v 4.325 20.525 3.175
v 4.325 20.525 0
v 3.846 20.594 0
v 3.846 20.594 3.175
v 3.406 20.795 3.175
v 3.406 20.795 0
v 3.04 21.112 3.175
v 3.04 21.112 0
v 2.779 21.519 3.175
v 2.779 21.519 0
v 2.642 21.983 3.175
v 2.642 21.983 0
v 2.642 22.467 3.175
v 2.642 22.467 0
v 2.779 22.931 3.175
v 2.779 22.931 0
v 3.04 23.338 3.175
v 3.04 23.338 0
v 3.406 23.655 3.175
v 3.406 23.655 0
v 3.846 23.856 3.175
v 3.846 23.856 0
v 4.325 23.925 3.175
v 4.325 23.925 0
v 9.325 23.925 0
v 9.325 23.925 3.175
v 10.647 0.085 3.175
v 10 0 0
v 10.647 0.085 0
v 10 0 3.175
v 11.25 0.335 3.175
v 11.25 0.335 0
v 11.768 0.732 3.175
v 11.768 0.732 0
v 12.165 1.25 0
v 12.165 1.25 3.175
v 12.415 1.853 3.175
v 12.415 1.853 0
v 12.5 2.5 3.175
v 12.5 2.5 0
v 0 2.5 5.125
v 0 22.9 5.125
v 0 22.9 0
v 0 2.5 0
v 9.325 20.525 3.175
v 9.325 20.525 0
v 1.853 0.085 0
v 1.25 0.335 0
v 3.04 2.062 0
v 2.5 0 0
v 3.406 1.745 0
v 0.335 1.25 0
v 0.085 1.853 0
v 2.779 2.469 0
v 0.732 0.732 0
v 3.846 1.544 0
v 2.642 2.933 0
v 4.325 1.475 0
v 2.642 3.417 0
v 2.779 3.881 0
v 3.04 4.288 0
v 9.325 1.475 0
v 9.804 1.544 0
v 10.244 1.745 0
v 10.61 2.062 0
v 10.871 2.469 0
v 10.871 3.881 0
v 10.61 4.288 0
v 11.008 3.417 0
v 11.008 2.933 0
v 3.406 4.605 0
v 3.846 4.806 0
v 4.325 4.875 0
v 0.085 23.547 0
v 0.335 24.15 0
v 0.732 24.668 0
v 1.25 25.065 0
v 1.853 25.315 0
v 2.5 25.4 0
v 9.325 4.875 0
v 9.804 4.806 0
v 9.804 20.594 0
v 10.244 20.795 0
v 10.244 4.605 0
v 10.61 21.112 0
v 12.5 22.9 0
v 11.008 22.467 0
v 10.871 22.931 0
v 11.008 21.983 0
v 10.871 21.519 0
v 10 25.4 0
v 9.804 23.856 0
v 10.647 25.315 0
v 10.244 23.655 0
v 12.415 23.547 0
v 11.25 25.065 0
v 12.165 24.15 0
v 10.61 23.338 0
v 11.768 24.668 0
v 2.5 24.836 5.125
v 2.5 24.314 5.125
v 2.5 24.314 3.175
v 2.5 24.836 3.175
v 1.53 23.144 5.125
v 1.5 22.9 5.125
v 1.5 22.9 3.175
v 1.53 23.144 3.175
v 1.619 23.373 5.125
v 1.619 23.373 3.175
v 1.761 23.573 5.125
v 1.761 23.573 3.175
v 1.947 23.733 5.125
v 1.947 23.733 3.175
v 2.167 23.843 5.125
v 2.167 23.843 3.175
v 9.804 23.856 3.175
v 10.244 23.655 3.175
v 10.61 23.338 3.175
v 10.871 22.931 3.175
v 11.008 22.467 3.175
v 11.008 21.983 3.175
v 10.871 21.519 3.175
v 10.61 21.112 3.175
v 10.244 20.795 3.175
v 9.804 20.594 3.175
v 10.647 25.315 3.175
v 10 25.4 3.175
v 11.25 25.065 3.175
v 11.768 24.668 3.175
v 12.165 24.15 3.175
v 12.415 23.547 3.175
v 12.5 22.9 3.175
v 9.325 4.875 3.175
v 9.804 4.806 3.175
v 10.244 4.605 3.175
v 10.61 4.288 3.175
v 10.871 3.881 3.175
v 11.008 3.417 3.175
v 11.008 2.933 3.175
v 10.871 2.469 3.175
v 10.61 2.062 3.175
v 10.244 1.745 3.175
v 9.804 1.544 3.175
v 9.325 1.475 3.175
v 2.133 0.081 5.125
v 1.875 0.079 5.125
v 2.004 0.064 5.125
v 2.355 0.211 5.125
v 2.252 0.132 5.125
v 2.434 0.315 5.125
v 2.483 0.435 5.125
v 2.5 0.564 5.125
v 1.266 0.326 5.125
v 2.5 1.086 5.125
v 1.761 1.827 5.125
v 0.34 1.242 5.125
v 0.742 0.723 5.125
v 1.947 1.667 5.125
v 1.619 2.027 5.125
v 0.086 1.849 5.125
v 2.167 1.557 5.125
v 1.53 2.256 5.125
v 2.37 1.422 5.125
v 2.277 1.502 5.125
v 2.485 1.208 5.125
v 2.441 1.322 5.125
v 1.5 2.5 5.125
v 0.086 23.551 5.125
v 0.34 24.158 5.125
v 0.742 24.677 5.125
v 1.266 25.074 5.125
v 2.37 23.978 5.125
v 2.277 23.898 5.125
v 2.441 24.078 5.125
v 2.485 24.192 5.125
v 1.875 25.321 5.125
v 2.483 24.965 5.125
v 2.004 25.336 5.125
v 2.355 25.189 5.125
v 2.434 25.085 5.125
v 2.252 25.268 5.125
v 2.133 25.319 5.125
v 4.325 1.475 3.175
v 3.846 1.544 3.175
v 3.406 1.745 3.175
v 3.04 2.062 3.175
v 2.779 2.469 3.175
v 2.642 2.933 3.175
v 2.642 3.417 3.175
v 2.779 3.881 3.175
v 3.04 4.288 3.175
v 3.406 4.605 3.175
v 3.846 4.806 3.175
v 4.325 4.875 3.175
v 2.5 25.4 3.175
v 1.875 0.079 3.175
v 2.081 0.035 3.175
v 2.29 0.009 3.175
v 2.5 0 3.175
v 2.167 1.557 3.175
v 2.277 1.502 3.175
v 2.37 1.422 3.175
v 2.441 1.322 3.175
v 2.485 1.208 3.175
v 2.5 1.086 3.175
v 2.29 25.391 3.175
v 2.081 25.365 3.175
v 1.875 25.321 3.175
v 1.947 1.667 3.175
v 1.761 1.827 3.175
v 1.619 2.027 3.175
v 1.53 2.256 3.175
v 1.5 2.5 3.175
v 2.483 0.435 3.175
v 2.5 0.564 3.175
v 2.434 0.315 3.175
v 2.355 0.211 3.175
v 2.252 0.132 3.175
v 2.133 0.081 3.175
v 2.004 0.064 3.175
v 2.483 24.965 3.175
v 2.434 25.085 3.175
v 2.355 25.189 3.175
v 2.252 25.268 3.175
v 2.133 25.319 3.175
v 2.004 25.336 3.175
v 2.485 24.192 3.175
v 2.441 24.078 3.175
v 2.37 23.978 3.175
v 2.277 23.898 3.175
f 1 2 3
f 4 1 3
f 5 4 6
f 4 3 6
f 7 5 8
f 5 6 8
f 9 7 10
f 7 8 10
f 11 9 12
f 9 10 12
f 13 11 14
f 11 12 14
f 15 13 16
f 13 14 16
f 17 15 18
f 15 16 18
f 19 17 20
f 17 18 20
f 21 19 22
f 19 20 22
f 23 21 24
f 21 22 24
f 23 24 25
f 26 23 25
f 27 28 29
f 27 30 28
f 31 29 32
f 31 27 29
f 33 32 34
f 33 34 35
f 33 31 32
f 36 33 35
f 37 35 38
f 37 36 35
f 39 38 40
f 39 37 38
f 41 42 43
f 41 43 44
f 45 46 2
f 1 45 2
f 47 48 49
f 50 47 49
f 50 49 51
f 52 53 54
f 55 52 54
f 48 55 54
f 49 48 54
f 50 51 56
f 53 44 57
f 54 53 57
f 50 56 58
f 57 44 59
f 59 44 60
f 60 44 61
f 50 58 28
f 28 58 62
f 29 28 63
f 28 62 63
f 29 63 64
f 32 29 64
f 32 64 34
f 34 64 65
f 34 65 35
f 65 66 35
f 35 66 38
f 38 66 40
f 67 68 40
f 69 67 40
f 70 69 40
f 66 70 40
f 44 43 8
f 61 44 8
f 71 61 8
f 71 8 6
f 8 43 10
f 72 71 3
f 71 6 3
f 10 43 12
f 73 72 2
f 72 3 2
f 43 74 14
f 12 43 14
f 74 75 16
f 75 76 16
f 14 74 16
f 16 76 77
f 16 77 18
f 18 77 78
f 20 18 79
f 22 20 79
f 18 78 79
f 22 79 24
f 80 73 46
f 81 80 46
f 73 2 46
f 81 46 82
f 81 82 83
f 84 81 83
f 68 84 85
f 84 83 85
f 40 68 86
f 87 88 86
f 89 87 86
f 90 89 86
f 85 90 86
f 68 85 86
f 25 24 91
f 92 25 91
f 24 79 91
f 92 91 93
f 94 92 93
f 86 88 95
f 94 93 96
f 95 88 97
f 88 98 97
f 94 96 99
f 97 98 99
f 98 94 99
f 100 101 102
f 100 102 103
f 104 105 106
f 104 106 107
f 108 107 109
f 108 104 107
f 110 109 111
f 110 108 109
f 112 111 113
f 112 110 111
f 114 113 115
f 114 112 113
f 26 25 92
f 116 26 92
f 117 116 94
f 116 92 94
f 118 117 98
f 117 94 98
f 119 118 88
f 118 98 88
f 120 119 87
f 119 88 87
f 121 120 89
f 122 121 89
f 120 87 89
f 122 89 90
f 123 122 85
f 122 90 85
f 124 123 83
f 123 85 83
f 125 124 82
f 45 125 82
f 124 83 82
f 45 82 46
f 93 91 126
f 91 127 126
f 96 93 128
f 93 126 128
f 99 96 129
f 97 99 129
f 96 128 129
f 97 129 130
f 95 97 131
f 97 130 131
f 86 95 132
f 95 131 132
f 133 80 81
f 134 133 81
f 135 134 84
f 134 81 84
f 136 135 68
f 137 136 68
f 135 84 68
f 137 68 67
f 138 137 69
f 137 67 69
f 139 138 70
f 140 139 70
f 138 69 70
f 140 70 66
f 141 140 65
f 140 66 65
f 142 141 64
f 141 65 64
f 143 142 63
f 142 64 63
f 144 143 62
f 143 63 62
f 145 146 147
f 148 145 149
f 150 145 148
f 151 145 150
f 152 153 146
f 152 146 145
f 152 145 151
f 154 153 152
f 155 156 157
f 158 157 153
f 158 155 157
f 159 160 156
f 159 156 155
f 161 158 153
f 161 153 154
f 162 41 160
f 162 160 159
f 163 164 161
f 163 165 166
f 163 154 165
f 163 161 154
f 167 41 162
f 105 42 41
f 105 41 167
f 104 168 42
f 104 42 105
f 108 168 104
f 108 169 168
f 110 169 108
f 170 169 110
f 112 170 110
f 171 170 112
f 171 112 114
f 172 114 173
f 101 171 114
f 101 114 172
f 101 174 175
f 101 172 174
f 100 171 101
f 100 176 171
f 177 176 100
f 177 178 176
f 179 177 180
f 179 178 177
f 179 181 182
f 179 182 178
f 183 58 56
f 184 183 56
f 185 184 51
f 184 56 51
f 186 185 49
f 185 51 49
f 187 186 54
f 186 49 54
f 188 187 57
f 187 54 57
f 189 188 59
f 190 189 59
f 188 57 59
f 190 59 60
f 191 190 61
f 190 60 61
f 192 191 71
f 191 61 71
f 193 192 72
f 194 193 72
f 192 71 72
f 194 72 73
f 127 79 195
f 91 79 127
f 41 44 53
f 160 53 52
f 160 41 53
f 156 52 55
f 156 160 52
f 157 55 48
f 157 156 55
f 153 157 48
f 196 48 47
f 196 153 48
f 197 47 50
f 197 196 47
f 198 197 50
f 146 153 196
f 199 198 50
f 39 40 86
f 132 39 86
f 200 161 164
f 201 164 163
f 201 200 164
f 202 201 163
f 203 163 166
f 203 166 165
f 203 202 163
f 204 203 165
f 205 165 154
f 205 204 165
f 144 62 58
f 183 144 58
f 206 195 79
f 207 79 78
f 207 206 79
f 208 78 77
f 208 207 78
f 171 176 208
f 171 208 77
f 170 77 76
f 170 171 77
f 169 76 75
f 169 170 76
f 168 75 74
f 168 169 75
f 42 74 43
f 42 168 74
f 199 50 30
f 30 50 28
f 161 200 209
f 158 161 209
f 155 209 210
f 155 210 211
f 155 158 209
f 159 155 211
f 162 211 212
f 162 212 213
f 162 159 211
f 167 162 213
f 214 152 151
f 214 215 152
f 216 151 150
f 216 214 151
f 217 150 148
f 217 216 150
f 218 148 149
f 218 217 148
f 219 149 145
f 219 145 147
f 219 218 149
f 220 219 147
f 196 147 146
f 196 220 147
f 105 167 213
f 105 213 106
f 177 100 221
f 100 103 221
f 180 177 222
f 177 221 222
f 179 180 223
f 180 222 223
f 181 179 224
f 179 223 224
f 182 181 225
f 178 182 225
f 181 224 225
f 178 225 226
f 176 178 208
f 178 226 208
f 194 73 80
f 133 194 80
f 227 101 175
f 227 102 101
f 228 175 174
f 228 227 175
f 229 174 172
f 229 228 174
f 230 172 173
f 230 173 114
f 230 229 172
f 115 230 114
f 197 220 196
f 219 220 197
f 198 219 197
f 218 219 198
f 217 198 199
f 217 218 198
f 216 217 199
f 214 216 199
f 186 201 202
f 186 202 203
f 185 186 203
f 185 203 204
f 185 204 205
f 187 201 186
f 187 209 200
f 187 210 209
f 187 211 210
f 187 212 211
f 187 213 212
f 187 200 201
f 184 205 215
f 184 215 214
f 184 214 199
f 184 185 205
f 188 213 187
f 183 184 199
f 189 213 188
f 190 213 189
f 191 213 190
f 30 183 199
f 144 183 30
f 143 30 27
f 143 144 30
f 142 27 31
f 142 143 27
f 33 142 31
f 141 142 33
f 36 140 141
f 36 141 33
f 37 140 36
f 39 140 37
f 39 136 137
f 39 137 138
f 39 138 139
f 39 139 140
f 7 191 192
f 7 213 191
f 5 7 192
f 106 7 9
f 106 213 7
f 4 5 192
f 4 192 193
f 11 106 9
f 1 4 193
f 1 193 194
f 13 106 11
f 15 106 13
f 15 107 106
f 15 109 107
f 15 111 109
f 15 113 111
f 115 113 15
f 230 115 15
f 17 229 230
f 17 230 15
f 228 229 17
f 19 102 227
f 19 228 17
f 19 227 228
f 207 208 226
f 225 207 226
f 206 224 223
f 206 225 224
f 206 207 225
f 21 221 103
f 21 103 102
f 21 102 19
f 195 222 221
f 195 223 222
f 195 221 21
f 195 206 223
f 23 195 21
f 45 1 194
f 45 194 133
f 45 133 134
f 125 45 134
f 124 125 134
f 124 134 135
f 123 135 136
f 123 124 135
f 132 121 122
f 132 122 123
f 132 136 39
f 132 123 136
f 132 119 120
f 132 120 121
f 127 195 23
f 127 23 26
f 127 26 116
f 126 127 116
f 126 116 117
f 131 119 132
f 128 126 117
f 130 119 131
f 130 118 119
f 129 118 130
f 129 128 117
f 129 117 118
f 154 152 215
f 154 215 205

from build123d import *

# Parameters (mm, degrees)
SKETCH1_W           = 12.500000000000002
SKETCH1_H           = 25.399999999999995
BOSS_EXTRUDE1_DEPTH = 3.175
FILLET1_R           = 2.5
BOSS_EXTRUDE2_START = 1.95
BOSS_EXTRUDE2_DEPTH = 1.95
FILLET2_R           = 0.5


with BuildPart() as part:
    # Sketch1 → Boss-Extrude1 (new body)
    with BuildSketch(Plane.XY):
        with Locations((6.250000000000001, 12.699999999999998)):
            Rectangle(SKETCH1_W, SKETCH1_H)
        with BuildLine():
            Line((4.325, 4.875000000000003), (9.325, 4.874999999999999))
            ThreePointArc((9.325, 4.874999999999999), (11.025, 3.1750000000000007), (9.325, 1.474999999999999))
            Line((9.325, 1.474999999999999), (4.325, 1.4750000000000023))
            ThreePointArc((4.325, 1.4750000000000023), (2.625, 3.1750000000000025), (4.325, 4.875000000000003))
        make_face(mode=Mode.SUBTRACT)
        with BuildLine():
            Line((4.325, 23.925000000000004), (9.325, 23.925000000000004))
            ThreePointArc((9.325, 23.925000000000004), (11.025000000000002, 22.225), (9.325, 20.525))
            Line((9.325, 20.525), (4.325, 20.525))
            ThreePointArc((4.325, 20.525), (2.624999999999994, 22.224999999999998), (4.325, 23.925000000000004))
        make_face(mode=Mode.SUBTRACT)
    extrude(amount=BOSS_EXTRUDE1_DEPTH)

    # Fillet1
    fillet1_edges = [part.edges().sort_by_distance(p)[0] for p in [
        (0, 25.4, 1.5875),
        (12.5, 25.4, 1.5875),
        (12.5, 0, 1.5875),
        (0, 0, 1.5875),
    ]]
    fillet(fillet1_edges, radius=FILLET1_R)

    # Sketch2 → Boss-Extrude2 (add)
    with BuildSketch(Plane.XY.offset(3.175).offset(BOSS_EXTRUDE2_START)):
        with BuildLine():
            Line((0, 22.9), (0, 2.5))
            ThreePointArc((0, 2.5), (0.7322330470336307, 0.7322330470336313), (2.5, 0))
            Line((2.5, 0), (2.5, 1.5))
            ThreePointArc((2.5, 1.5), (1.7928932188134532, 1.7928932188134517), (1.5, 2.4999999999999987))
            Line((1.5, 2.4999999999999987), (1.5000000000000004, 22.9))
            ThreePointArc((1.5000000000000004, 22.9), (1.7928932188134499, 23.60710678118655), (2.5, 23.900000000000002))
            Line((2.5, 23.900000000000002), (2.5, 25.4))
            ThreePointArc((2.5, 25.4), (0.7322330470336313, 24.667766952966367), (0, 22.9))
        make_face()
    extrude(amount=-BOSS_EXTRUDE2_DEPTH)

    # Fillet2
    fillet2_edges = [part.edges().sort_by_distance(p)[0] for p in [
        (2.5, 25.4, 4.15),
        (2.5, 0, 4.15),
        (2.5, 1.5000000000000002, 4.15),
        (2.5, 23.900000000000002, 4.15),
    ]]
    fillet(fillet2_edges, radius=FILLET2_R)


solid = part.part
